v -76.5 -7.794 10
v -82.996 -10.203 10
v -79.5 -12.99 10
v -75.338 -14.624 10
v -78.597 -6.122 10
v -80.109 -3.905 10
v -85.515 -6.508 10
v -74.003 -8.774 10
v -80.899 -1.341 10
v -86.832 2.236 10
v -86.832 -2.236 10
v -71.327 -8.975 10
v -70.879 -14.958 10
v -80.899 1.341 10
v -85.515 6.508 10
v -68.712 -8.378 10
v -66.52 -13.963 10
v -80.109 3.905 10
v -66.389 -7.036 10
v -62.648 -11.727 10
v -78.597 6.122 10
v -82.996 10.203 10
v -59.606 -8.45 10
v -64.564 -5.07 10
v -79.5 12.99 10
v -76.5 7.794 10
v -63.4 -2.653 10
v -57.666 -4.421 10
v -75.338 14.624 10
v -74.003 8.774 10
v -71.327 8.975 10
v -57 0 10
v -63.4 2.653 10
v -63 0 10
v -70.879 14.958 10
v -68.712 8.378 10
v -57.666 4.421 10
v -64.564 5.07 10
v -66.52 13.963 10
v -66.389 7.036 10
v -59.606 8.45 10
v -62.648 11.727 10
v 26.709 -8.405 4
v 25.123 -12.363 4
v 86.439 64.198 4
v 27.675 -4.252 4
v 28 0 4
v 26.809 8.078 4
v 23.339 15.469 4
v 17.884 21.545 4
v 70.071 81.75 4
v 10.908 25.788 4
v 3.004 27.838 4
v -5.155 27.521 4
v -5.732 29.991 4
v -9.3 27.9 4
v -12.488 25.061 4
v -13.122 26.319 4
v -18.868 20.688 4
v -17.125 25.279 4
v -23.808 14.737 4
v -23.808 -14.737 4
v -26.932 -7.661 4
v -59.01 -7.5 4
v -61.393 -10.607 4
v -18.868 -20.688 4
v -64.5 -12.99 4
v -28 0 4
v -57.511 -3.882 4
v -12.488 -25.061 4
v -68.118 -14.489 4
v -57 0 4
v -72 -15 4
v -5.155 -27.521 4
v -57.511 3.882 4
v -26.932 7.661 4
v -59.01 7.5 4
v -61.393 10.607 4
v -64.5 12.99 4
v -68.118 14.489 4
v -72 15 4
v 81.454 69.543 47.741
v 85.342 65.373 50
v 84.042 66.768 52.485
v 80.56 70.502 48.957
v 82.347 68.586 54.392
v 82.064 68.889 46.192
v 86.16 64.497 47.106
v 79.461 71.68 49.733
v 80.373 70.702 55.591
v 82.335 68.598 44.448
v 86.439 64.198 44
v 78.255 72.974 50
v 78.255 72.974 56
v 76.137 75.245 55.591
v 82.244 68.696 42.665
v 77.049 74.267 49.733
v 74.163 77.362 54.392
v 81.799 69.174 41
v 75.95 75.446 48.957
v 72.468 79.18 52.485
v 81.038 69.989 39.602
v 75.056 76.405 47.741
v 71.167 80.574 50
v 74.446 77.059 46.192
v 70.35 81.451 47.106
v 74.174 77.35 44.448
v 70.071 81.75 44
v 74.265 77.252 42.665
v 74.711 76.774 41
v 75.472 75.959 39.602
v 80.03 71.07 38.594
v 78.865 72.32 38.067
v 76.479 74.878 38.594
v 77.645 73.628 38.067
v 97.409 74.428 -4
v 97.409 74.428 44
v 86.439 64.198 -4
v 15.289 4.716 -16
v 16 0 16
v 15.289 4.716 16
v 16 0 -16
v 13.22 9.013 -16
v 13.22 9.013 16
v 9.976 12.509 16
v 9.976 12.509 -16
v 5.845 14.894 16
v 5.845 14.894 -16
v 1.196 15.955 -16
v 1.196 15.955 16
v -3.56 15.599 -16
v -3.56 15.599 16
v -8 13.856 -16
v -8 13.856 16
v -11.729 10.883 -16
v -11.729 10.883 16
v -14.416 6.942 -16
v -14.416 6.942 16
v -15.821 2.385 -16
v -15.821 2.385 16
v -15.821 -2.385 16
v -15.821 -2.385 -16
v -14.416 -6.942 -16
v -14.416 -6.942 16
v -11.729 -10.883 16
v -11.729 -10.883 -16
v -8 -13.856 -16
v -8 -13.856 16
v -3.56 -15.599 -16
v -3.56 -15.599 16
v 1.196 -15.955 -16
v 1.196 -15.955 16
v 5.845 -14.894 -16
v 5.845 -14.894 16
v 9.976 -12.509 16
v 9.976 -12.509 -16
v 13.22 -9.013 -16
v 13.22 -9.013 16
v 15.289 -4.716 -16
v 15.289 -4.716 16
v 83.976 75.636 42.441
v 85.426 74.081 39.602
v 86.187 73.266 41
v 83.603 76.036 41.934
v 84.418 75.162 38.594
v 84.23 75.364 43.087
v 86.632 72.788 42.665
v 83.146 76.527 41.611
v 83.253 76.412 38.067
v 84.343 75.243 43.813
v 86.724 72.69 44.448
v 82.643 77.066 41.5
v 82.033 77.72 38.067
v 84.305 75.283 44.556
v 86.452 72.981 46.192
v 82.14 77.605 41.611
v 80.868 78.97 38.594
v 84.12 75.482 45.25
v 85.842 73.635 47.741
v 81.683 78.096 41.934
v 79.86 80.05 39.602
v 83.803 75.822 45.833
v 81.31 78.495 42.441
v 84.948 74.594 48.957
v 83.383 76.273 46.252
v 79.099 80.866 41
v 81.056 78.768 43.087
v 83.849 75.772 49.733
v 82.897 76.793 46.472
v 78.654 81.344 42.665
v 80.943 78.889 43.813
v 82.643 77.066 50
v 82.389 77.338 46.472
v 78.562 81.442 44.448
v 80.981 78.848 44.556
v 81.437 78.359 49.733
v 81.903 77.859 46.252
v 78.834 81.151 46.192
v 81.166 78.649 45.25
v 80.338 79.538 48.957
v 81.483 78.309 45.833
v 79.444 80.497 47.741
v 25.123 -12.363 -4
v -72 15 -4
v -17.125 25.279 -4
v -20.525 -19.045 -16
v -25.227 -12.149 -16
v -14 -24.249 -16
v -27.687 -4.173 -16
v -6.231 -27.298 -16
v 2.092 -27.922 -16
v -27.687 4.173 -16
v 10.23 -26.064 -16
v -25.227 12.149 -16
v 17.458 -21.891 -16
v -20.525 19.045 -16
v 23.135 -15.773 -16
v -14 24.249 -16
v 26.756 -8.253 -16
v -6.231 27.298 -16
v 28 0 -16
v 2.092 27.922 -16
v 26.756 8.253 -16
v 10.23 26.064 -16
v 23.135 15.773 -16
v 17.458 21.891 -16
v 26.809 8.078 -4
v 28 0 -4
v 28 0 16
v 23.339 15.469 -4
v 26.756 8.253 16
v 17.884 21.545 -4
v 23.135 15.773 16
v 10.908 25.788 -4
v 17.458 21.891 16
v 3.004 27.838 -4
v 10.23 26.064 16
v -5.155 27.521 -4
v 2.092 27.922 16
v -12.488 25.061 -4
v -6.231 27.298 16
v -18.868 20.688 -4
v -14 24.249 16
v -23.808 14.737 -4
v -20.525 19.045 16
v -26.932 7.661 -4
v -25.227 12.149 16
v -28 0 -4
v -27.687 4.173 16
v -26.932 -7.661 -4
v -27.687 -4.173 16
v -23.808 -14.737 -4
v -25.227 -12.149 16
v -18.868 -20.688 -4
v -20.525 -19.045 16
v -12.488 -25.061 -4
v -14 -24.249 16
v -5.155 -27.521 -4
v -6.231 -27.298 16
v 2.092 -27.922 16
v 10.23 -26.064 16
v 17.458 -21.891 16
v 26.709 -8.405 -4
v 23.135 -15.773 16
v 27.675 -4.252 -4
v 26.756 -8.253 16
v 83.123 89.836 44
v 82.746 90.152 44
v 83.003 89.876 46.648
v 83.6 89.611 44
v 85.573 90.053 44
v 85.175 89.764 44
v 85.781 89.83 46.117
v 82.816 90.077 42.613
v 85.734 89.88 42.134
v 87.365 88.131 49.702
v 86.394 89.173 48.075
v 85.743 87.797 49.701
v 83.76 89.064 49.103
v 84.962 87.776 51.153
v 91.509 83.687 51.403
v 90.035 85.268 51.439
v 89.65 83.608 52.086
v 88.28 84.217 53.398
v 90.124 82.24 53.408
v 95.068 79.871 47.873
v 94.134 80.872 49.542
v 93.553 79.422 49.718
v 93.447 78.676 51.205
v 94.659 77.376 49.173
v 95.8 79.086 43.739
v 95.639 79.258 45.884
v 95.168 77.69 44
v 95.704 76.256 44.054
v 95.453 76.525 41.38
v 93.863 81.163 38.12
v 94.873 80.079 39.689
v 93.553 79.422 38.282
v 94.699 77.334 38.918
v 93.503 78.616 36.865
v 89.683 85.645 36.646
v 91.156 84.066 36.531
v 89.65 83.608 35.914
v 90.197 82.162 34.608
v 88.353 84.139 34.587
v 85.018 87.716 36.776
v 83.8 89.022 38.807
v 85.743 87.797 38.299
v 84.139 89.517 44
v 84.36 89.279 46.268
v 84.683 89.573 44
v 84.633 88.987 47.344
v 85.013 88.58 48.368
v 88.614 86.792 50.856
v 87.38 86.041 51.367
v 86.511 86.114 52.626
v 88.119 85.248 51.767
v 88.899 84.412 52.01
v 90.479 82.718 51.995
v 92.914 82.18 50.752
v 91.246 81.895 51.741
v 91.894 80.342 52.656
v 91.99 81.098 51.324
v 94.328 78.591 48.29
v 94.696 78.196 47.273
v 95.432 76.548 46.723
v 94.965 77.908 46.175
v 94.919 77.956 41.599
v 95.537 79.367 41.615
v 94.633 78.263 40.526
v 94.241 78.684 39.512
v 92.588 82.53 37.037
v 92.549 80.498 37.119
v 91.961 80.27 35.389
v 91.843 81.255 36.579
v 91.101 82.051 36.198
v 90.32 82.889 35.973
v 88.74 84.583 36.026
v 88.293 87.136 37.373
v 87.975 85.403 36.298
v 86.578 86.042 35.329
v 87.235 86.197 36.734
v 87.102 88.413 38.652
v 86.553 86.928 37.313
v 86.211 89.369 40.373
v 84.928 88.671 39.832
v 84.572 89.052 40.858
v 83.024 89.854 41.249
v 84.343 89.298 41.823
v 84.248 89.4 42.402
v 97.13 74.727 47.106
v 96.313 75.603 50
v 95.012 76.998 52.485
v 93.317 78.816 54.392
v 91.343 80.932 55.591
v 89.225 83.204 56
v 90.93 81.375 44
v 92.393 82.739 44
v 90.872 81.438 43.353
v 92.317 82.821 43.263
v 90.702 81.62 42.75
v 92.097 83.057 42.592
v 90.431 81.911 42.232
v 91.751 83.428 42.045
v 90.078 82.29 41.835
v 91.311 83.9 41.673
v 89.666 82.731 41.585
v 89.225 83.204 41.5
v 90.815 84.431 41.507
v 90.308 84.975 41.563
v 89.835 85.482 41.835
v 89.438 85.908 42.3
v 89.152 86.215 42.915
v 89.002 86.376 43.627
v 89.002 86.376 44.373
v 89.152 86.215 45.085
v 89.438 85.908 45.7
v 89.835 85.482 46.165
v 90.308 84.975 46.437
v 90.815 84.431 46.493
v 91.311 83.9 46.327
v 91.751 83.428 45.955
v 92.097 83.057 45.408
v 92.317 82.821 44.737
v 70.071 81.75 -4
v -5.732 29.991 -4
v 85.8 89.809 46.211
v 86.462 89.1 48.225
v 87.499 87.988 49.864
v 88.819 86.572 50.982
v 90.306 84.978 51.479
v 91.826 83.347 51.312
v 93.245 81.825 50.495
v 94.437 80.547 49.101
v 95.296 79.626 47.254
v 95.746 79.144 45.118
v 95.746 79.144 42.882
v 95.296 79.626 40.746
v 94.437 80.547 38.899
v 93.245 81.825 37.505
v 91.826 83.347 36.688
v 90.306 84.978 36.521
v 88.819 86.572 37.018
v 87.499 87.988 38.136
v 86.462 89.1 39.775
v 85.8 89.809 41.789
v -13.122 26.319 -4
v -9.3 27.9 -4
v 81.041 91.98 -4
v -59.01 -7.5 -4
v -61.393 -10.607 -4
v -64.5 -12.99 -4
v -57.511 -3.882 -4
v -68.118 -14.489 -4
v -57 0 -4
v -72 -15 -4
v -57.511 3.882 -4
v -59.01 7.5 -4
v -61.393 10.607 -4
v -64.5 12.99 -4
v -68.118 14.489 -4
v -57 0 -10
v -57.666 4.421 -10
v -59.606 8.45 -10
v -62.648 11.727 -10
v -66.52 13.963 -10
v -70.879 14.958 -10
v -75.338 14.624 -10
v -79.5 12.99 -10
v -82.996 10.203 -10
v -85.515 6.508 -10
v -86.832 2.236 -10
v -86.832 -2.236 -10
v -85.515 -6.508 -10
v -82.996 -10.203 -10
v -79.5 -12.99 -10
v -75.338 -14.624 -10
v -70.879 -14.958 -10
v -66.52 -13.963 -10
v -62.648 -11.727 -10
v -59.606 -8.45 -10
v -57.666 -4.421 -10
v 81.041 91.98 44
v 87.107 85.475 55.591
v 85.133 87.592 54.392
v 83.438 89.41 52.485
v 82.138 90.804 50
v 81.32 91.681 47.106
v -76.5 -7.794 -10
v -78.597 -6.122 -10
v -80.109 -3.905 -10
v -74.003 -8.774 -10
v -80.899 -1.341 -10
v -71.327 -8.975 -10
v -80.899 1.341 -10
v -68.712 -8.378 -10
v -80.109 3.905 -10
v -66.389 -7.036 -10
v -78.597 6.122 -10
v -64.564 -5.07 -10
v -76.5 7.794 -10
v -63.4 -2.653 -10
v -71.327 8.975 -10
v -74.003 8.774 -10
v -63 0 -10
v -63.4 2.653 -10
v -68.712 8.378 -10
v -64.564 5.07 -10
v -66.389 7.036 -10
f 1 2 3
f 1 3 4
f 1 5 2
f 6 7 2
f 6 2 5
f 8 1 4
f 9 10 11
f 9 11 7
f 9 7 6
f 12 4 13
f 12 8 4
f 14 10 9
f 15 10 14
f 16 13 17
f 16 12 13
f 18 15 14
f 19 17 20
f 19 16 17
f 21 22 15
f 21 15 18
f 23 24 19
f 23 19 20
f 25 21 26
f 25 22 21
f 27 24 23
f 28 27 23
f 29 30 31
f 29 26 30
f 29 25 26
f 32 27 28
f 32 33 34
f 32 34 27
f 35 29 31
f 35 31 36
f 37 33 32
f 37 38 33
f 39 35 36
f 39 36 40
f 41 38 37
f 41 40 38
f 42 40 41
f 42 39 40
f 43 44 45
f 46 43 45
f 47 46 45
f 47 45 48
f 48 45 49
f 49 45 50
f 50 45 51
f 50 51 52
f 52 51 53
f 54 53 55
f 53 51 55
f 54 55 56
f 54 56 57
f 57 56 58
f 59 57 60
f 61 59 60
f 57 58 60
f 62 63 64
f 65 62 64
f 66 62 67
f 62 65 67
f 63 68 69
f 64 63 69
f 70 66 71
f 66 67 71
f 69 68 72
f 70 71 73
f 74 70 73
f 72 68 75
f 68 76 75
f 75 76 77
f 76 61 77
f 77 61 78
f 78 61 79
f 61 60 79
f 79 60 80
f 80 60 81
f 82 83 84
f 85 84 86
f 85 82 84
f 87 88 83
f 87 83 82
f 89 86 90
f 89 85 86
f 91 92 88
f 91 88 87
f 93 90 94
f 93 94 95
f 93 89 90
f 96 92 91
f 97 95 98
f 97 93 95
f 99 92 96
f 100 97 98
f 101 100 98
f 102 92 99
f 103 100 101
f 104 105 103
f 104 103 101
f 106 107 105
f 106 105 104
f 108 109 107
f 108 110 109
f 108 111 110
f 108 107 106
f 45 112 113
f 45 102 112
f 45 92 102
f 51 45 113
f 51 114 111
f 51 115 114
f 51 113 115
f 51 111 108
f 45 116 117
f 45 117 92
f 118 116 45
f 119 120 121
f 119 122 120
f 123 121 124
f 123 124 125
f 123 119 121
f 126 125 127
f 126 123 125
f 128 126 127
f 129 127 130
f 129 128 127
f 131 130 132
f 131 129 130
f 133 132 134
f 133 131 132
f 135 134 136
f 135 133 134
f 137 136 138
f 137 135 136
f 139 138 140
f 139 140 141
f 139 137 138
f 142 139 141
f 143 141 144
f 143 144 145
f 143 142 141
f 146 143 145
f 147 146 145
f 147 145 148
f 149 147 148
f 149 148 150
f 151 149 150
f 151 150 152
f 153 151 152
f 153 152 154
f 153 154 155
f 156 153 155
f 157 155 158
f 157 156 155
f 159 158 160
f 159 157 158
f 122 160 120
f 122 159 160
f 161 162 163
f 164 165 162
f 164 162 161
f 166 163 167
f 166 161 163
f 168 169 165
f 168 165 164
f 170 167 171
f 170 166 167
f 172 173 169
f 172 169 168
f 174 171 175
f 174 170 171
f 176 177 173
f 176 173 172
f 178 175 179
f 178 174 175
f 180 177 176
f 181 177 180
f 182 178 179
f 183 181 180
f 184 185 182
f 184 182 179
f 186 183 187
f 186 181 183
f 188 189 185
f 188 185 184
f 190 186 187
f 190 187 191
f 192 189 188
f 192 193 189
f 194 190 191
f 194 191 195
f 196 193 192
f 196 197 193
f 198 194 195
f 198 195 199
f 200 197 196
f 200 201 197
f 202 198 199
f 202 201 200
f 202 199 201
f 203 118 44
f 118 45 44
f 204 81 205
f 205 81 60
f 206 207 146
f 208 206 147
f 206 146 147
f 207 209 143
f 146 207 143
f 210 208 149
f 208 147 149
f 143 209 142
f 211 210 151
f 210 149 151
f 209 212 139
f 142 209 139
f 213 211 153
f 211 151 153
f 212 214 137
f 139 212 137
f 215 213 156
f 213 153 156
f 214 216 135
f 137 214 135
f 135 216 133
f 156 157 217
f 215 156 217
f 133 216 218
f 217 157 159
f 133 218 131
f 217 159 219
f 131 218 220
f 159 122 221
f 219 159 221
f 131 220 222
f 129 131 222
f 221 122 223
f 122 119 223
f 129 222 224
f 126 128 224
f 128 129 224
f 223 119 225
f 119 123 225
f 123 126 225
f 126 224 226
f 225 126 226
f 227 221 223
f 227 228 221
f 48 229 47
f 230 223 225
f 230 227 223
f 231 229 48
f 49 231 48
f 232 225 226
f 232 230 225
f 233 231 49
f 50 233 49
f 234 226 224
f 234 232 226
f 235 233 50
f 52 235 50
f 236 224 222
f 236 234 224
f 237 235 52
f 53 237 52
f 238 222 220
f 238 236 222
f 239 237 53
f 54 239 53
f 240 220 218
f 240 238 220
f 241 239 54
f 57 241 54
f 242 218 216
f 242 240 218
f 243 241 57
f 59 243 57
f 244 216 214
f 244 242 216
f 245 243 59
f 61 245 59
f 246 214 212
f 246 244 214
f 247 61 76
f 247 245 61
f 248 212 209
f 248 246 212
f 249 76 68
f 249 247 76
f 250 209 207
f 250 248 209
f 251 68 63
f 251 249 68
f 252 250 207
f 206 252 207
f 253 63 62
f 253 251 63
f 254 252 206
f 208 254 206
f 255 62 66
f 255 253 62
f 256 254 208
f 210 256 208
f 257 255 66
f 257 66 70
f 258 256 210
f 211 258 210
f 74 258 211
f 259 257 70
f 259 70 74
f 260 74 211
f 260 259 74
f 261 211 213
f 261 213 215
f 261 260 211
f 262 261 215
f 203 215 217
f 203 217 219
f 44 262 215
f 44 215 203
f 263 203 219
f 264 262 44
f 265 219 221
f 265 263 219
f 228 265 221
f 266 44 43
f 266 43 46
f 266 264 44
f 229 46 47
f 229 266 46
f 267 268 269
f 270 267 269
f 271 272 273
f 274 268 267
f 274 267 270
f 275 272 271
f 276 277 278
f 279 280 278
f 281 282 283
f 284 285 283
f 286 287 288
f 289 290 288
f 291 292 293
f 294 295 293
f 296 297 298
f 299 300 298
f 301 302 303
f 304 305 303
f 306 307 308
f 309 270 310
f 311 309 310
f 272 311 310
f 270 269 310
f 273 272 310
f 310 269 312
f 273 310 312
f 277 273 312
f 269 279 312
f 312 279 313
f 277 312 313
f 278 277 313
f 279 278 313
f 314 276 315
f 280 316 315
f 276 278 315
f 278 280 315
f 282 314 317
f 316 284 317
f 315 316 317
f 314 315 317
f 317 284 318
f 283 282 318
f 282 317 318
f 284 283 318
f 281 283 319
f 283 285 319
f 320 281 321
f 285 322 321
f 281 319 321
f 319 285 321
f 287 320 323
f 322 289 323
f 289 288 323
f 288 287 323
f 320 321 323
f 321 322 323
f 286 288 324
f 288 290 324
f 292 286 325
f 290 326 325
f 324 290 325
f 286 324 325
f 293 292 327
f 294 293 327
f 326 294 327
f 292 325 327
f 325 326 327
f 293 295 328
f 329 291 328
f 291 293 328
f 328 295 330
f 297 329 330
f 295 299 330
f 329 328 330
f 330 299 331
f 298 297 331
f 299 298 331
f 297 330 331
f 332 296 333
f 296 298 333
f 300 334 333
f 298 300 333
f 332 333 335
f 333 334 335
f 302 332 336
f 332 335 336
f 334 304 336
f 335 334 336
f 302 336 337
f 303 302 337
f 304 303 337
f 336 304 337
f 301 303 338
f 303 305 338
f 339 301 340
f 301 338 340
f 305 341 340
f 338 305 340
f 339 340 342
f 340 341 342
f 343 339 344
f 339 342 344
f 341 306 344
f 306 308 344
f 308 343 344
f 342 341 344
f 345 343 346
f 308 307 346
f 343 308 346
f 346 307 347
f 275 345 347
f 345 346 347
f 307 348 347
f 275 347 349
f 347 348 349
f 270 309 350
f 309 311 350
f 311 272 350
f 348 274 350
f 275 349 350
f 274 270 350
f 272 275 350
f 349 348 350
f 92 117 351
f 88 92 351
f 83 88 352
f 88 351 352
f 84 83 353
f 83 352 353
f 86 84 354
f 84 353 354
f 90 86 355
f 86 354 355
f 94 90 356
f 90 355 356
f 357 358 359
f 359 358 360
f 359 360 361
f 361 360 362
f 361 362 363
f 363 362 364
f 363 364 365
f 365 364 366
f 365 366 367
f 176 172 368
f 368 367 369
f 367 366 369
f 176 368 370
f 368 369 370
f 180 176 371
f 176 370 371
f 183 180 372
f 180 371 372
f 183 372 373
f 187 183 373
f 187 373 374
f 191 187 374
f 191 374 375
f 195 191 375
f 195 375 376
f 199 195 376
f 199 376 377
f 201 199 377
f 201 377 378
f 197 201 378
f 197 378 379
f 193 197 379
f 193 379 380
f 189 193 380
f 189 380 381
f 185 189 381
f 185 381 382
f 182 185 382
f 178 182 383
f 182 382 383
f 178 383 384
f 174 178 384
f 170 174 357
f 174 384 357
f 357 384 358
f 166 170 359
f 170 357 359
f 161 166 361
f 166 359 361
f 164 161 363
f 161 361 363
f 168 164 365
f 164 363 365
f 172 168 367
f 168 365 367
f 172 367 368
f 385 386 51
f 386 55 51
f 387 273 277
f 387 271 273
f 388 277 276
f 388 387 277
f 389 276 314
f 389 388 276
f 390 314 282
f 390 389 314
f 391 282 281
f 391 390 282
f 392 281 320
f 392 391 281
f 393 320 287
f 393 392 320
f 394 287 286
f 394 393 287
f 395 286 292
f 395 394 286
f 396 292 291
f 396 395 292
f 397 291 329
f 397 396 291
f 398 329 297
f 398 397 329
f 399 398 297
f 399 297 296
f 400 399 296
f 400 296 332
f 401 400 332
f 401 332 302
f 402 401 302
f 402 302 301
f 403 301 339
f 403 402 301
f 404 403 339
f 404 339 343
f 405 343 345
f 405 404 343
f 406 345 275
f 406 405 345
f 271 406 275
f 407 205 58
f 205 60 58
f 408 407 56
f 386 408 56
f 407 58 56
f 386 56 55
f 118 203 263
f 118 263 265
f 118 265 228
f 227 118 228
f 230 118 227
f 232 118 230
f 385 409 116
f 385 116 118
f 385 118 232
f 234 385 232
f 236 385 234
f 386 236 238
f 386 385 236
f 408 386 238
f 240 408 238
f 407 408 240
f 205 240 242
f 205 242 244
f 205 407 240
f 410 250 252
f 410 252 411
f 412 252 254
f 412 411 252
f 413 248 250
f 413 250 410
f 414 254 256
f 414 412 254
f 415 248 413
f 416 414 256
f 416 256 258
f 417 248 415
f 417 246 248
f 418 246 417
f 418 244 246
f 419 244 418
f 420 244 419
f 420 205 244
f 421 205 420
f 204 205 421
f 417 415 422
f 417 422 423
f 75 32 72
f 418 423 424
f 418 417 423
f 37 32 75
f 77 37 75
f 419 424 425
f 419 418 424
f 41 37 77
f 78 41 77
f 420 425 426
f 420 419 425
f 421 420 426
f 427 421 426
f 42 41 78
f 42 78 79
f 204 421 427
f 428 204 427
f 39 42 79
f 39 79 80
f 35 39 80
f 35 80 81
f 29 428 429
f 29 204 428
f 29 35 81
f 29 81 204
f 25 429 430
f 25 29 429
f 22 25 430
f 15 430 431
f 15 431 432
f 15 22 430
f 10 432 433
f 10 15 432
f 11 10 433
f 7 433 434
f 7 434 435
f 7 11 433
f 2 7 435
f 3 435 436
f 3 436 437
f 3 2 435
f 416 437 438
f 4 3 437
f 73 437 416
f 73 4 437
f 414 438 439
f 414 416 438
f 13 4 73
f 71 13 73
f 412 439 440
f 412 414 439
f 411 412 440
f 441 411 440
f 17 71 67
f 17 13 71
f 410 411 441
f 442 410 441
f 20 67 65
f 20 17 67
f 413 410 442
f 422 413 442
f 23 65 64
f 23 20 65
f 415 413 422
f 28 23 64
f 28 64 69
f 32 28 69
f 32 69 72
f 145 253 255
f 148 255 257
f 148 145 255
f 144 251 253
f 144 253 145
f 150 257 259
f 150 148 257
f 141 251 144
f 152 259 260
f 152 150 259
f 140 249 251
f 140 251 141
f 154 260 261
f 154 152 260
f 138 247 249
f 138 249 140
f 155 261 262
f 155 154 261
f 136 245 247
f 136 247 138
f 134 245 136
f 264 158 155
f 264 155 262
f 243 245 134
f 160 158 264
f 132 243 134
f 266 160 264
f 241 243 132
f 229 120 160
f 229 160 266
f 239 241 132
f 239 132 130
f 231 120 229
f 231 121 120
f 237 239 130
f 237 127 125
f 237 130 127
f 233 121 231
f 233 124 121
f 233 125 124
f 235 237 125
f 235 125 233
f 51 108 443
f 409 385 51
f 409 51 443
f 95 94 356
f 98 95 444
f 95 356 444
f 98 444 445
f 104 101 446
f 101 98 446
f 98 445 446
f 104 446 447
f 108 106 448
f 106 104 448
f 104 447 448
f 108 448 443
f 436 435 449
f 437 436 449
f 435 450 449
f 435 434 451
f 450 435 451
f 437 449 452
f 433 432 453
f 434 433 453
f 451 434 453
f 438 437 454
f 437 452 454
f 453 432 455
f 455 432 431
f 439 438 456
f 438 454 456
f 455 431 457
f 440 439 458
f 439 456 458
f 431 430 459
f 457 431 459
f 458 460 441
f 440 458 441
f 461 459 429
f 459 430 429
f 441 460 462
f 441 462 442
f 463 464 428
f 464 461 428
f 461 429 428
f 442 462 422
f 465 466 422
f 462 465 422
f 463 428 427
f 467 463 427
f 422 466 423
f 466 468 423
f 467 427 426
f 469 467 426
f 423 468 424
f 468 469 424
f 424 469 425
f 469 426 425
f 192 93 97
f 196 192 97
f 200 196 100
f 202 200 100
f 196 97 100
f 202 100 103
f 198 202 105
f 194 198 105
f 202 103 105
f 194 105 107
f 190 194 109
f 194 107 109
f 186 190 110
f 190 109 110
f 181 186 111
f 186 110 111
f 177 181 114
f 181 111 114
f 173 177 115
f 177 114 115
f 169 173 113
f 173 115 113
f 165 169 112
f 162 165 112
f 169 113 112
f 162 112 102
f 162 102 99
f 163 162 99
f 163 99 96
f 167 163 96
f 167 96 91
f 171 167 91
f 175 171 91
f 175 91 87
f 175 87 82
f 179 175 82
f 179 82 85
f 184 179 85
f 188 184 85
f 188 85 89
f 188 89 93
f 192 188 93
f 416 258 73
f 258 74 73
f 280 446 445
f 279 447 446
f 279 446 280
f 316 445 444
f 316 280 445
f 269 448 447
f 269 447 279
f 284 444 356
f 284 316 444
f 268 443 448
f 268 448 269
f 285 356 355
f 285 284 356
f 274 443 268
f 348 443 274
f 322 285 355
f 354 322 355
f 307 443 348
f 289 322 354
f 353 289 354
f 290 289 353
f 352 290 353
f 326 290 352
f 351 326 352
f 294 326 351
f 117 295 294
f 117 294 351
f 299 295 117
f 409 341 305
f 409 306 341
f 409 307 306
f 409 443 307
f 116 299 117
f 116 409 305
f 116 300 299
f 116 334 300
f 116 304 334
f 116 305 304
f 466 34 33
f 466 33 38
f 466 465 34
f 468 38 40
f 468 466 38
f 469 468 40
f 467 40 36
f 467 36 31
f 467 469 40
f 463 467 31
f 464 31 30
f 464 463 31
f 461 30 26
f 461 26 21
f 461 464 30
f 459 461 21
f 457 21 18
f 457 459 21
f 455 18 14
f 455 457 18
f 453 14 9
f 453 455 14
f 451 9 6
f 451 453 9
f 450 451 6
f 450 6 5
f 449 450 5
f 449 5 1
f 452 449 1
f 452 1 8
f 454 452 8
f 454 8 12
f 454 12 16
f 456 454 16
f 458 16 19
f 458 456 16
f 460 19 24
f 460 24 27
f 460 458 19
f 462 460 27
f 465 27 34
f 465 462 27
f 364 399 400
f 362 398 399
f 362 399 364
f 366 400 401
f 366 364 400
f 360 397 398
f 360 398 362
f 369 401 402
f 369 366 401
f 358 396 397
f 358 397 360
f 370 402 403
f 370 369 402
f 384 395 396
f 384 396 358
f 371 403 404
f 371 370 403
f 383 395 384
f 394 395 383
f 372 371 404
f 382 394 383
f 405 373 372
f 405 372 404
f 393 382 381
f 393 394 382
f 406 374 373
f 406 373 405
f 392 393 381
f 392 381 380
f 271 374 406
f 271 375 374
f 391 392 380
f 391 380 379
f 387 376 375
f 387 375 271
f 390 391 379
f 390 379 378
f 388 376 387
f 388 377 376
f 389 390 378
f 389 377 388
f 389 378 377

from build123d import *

# Parameters (mm, degrees)
SKETCH1_R           = 28
SKETCH1_R_2         = 16
BOSS_EXTRUDE1_DEPTH = 16
SKETCH2_R           = 15
SKETCH2_R_2         = 9
BOSS_EXTRUDE2_DEPTH = 10
BOSS_EXTRUDE3_DEPTH = 4
BOSS_EXTRUDE4_DEPTH = 4
BOSS_EXTRUDE5_DEPTH = 60
CUT_EXTRUDE1_DEPTH  = 216.77207691
HOLE1_D             = 5
HOLE1_CBORE_D       = 12
HOLE1_CBORE_DEPTH   = 6
BOSS_EXTRUDE6_START = 2
SKETCH9_R           = 7.5
SKETCH9_R_2         = 2.5
BOSS_EXTRUDE6_DEPTH = 2
FILLET1_R           = 30
FILLET2_R           = 2


with BuildPart() as part:
    # Sketch1 → Boss-Extrude1 (new, symmetric)
    with BuildSketch(Plane.XY):
        Circle(SKETCH1_R)
        Circle(SKETCH1_R_2, mode=Mode.SUBTRACT)
    extrude(amount=BOSS_EXTRUDE1_DEPTH, both=True)



with BuildPart() as body_2:
    # Sketch2 → Boss-Extrude2 (new, symmetric)
    with BuildSketch(Plane.XY):
        with Locations((-72, 0)):
            Circle(SKETCH2_R)
        with Locations((-72, 0)):
            Circle(SKETCH2_R_2, mode=Mode.SUBTRACT)
    extrude(amount=BOSS_EXTRUDE2_DEPTH, both=True)


with BuildPart() as part_1:
    add(part.part)

    add(body_2.part)  # Boss-Extrude3 merges body 2
    # Sketch3 → Boss-Extrude3 (add, symmetric)
    with BuildSketch(Plane.XY):
        with BuildLine():
            Line((-72, 15), (-5.155280446, 27.521320527))
            ThreePointArc((-5.155280446, 27.521320527), (-28, 0), (-5.155280446, -27.521320527))
            Line((-5.155280446, -27.521320527), (-72, -15))
            ThreePointArc((-72, -15), (-57, 0), (-72, 15))
        make_face()
    extrude(amount=BOSS_EXTRUDE3_DEPTH, both=True)

    # Sketch4 → Boss-Extrude4 (add, symmetric)
    with BuildSketch(Plane.XY):
        with BuildLine():
            Line((70.070865753, 81.750068946), (86.438826394, 64.197580107))
            Line((86.438826394, 64.197580107), (25.1229929, -12.362654559))
            ThreePointArc((25.1229929, -12.362654559), (22.301575109, 16.930438496), (-5.155280446, 27.521320527))
            Line((-5.155280446, 27.521320527), (-10.933902304, 26.438871876))
            Line((-10.933902304, 26.438871876), (70.070865753, 81.750068946))
        make_face()
    extrude(amount=BOSS_EXTRUDE4_DEPTH, both=True)

    # Sketch5 → Boss-Extrude5 (add)
    with BuildSketch(Plane(origin=(0, 0, -4), x_dir=(-1, 0, 0), z_dir=(0, 0, -1))):
        Polygon((-70.070865753, 81.750068946), (-81.041171277, 91.980044347), (-97.409131918, 74.427555508), (-86.438826394, 64.197580107), align=None)
    extrude(amount=-BOSS_EXTRUDE5_DEPTH)

    # Sketch6 → Cut-Extrude1 (cut, through all)
    with BuildSketch(Plane(origin=(89.225151598, 83.203799928, 0), x_dir=(0, 0, -1), z_dir=(0.7313537016191697, 0.6819983600624995, 0))):
        with BuildLine():
            Line((-56, 12), (-56, 0))
            ThreePointArc((-56, 0), (-52.485281374, 8.485281374), (-44, 12))
            Line((-44, 12), (-56, 12))
        make_face()
        with BuildLine():
            Line((-56, 0), (-56, -12))
            Line((-56, -12), (-44, -12))
            ThreePointArc((-44, -12), (-52.485281374, -8.485281374), (-56, 0))
        make_face()
    extrude(amount=-CUT_EXTRUDE1_DEPTH, mode=Mode.SUBTRACT)

    # Hole1 (through all)
    with Locations(Plane(origin=(78.254846073, 72.973824527, 0), x_dir=(0, 0, 1), z_dir=(-0.7313537016191697, -0.6819983600624995, 0))):
        with Locations((44, 0)):
            CounterBoreHole(HOLE1_D / 2, HOLE1_CBORE_D / 2, HOLE1_CBORE_DEPTH)

    # Sketch9 → Boss-Extrude6 (add)
    with BuildSketch(Plane(origin=(89.225151598, 83.203799928, 0), x_dir=(0, 0, -1), z_dir=(0.7313537016191697, 0.6819983600624995, 0)).offset(BOSS_EXTRUDE6_START)):
        with Locations(Location((-44, 0, 0), (0, 0, 90))):
            Circle(SKETCH9_R)
        with Locations(Location((-44, 0, 0), (0, 0, 270))):
            Circle(SKETCH9_R_2, mode=Mode.SUBTRACT)
    extrude(amount=-BOSS_EXTRUDE6_DEPTH)

    # Fillet1
    fillet1_edges = [part_1.edges().sort_by_distance(p)[0] for p in [
        (-10.933902304, 26.438871876, 0),
    ]]
    fillet(fillet1_edges, radius=FILLET1_R)

    # Fillet2
    fillet2_edges = [part_1.edges().sort_by_distance(p)[0] for p in [
        (94.340139298, 77.718647165, 44),
    ]]
    fillet(fillet2_edges, radius=FILLET2_R - 0.0001)  # a hair under: the kernel refuses the full size


solid = part_1.part
